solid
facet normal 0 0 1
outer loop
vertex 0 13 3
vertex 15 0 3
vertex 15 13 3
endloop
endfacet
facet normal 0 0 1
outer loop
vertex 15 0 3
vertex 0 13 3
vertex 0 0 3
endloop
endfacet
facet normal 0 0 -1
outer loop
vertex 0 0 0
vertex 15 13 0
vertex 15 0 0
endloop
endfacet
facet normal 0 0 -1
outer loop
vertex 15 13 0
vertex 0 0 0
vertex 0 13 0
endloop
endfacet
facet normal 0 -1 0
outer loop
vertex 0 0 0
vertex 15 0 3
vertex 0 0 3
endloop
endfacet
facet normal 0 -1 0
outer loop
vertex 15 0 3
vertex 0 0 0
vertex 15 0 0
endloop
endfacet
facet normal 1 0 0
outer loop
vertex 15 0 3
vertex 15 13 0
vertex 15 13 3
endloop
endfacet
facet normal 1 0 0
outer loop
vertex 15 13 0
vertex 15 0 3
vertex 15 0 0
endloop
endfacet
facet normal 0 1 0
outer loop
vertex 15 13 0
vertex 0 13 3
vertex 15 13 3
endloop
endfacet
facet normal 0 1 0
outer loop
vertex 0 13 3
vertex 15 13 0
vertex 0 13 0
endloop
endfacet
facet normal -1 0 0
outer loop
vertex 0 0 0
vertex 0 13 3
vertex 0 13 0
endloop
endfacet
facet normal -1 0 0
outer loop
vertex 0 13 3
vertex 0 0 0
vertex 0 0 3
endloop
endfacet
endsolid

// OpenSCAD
// Generated by SolidPython 1.0.1 on 2020-07-29 00:46:55


cube(size = [15, 13, 3]);
/***********************************************
*********      SolidPython code:      **********
************************************************
 
# import packages: SolidPython
from solid import *
from solid.utils import *
from itertools import chain, combinations, permutations


class Resize:

    def __init__(self, scad_file):
        self.scad_file = scad_file
        #self.scad_file = import_scad(scad_file)
        # cone/cylinder param:
        self.r1 = 0
        self.r2 = 0
        self.h = 0
        # rectangular prism param:
        self.w = 0
        self.l = 0
        # ellipse param:
        self.r = 0

    # import OpenScad code (file name corresponds to shape)


    # classify shape + parameters
    def assign(self, param1, param2, param3):
        if self.scad_file == 'cone.scad':
            self.r1 = param1
            self.r2 = param2
            self.h = param3
        elif self.scad_file == 'cylinder.scad':
            self.r1 = param1
            self.r2 = param2
            self.h = param3
        elif self.scad_file == 'rectangularPrism.scad':
            self.h = param1
            self.l = param2
            self.w = param3
        else:
            self.r = param1
            self.h = param2

    # resize parameters
    def iterate(self):
        x = range(3, 20, 2)
        i = 1
        if self.scad_file == 'cone.scad':
            tempList = list(permutations(x, 2))
            for temp in tempList:
                param1 = temp[0]
                param2 = temp[1]
                filepath = 'produced_scad_files/' + 'cone' + str(param1) + '_' + str(param2) + '_' + '.scad'
                scad_render_to_file(cylinder(h=param1, r1=param2, r2=0), filepath)

        elif self.scad_file == 'cylinder.scad':
            tempList = list(permutations(x, 3))
            for temp in tempList:
                param1 = temp[0]
                param2 = temp[1]
                filepath = 'produced_scad_files/' + 'cylinder' + str(param1) + '_' + str(param2) + '_' + '.scad'
                scad_render_to_file(cylinder(h=param1, r1=param2, r2=param2), filepath)

        elif self.scad_file == 'rectangularPrism.scad':
            tempList = list(permutations(x, 3))
            for temp in tempList:
                param1 = temp[0]
                param2 = temp[1]
                param3 = temp[2]
                filepath = 'produced_scad_files/' + 'rectangularPrism' + str(param1) + '_' + str(param2) + '_' + str(
                    param3) + '.scad'
                scad_render_to_file(cube(size=(param1, param2, param3)), filepath)

        elif self.scad_file == 'ellipse.scad':
            tempList = list(permutations(x, 4))
            for temp in tempList:
                param1 = temp[0]
                param2 = temp[1]
                param3 = temp[2]
                param4 = temp[3]
                filepath = 'produced_scad_files/' + 'ellipse' + str(param1) + '_' + str(param2) + '_' + str(param3) + '_' + str(param4) + '.scad'
                scad_render_to_file(scale([param1, param2, param3])(sphere(r=param4)), filepath)

    def render_to_scadfile(self):
        scad_render_to_file(scad, 'example.scad') 
 
************************************************/
